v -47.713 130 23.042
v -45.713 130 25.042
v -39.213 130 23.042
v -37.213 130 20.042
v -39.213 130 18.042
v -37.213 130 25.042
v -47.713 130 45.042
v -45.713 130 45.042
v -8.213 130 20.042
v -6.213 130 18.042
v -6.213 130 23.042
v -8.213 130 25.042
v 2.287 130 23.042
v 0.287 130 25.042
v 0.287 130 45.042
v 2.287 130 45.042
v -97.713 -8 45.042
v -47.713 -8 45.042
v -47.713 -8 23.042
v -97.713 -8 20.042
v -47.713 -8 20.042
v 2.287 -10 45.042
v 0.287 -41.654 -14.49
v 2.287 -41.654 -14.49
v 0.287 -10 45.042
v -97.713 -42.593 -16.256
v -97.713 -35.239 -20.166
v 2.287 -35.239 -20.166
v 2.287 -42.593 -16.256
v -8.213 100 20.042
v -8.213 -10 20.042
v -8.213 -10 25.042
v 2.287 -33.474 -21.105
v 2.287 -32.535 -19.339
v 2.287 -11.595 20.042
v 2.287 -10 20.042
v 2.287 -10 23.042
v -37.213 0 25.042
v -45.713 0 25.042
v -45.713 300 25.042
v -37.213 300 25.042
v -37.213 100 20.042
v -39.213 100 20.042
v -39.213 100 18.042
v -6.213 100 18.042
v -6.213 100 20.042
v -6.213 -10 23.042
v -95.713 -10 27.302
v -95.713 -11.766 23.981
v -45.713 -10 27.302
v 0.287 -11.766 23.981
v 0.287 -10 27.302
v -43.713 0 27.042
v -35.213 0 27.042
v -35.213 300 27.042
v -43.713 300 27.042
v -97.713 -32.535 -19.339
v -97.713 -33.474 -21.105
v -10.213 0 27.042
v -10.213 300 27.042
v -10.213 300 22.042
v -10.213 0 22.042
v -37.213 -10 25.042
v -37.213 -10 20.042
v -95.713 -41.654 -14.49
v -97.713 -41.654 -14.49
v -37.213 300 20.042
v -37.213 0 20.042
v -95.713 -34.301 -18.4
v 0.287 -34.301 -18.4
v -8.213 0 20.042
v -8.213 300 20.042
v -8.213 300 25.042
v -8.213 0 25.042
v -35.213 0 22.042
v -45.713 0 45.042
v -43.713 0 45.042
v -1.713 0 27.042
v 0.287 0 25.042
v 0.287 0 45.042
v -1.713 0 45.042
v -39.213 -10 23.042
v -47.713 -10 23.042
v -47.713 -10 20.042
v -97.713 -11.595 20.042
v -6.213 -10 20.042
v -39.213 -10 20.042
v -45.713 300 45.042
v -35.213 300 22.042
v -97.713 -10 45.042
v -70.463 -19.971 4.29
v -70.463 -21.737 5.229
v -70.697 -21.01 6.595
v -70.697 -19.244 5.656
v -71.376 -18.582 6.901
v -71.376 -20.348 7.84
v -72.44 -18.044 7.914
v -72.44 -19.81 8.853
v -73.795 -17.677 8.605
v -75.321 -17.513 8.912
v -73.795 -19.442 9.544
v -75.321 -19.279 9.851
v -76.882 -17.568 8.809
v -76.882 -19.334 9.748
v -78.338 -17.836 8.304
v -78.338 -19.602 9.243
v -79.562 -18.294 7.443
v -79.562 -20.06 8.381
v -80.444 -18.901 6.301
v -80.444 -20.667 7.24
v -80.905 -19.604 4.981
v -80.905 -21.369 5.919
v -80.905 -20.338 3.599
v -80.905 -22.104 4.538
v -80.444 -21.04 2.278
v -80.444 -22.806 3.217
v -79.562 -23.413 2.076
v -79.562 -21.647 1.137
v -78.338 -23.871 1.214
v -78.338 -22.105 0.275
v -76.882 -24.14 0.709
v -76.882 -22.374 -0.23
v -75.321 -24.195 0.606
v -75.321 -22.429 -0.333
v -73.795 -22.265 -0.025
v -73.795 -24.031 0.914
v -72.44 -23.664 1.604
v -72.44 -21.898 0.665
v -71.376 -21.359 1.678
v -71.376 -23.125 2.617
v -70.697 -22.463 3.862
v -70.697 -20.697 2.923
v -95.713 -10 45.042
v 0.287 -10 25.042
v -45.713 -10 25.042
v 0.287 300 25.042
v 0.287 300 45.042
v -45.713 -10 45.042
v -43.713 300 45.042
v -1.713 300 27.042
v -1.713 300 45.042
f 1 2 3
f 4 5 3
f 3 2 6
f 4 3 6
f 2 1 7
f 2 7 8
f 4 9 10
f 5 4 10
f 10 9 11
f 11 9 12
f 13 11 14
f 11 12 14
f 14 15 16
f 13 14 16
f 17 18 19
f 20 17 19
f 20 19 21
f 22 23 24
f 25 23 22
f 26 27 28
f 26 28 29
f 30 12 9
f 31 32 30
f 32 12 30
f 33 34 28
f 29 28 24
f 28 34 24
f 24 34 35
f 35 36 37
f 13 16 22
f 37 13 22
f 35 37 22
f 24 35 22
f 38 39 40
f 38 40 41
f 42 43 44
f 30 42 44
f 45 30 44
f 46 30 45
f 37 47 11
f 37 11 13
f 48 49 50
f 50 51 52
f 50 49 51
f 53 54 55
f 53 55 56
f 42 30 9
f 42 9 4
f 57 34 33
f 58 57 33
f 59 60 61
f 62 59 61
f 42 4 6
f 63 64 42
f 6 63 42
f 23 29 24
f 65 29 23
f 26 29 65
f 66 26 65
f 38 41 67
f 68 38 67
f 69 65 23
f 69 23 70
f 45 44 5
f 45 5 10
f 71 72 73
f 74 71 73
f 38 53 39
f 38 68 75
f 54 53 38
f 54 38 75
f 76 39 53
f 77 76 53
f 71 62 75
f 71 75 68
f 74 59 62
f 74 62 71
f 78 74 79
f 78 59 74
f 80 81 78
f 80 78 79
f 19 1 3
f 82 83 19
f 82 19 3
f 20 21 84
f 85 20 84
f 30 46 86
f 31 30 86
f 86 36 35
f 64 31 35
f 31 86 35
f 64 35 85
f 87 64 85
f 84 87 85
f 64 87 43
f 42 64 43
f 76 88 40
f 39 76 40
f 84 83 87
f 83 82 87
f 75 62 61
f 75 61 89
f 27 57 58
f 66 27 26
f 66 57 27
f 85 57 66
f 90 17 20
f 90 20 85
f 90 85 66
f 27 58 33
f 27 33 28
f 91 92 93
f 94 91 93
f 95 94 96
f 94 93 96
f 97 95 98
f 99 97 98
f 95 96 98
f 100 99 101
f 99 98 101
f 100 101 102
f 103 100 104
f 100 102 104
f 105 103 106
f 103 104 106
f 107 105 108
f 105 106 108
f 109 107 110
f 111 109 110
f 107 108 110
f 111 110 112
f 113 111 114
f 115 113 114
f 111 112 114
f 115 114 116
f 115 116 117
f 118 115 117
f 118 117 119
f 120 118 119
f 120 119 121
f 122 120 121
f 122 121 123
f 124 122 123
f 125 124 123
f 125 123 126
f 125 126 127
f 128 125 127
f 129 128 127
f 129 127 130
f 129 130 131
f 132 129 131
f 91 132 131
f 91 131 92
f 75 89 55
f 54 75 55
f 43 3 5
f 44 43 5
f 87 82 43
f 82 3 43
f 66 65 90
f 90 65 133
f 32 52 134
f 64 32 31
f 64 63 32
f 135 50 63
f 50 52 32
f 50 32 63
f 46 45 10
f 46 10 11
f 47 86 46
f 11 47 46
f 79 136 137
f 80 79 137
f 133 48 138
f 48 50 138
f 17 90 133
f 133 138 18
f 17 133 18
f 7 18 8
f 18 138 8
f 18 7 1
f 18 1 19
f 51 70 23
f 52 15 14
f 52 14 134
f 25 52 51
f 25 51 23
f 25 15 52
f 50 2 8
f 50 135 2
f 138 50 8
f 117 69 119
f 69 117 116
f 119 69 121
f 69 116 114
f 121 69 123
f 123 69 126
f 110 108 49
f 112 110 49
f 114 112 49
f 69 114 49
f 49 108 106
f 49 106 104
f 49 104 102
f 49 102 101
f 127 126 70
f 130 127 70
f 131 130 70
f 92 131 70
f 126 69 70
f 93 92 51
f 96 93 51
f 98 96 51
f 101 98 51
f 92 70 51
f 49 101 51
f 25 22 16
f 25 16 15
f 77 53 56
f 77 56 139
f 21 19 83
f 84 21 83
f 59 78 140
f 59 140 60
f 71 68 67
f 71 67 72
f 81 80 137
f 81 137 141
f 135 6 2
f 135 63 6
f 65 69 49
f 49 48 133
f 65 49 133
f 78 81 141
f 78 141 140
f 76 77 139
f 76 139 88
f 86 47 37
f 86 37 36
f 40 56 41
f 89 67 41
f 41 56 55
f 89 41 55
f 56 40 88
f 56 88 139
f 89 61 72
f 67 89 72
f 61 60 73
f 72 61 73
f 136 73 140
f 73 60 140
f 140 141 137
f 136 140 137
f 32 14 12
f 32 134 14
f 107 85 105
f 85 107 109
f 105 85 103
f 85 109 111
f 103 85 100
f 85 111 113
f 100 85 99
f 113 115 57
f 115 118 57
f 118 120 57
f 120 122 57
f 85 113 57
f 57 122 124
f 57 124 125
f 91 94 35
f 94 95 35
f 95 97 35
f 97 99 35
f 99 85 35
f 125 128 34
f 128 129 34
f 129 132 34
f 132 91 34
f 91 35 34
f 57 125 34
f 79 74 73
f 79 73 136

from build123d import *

# Parameters (mm, degrees)
F1_DEPTH       = 300
F2_DEPTH       = 10
F2_DEPTH_BACK  = 130
F4_DEPTH       = 50
F4_DEPTH_BACK  = 50
F5_START       = -48
F5_DEPTH       = 2
F6_START       = -100
F6_DEPTH       = 30
F8_START       = 48
F8_DEPTH       = 2
F3_W           = 2
F3_H           = 3
F9_DEPTH       = 50
F10_DEPTH      = 50
F10_DEPTH_BACK = 50
F7_R           = 5.25
F11_DEPTH      = 25


with BuildPart() as f1:
    # F0 (on Front) → F1 (new body)
    with BuildSketch(Plane.XZ):
        Polygon((-43.7134447098, 45.0421461165), (-45.7134447098, 45.0421461165), (-45.7134447098, 25.0421461165), (-37.2134447098, 25.0421461165), (-37.2134447098, 20.0421461165), (-8.2134447098, 20.0421461165), (-8.2134447098, 25.0421461165), (0.2865552902, 25.0421461165), (0.2865552902, 45.0421461165), (-1.7134447098, 45.0421461165), (-1.7134447098, 27.0421461165), (-10.2134447098, 27.0421461165), (-10.2134447098, 22.0421461165), (-35.2134447098, 22.0421461165), (-35.2134447098, 27.0421461165), (-43.7134447098, 27.0421461165), align=None)
    extrude(amount=-F1_DEPTH)


with BuildPart() as f2:
    # F0 (on Front) → F2 (new body, two sides)
    with BuildSketch(Plane.XZ) as f2_sk:
        Polygon((-45.7134447098, 25.0421461165), (-45.7134447098, 45.0421461165), (-47.7134447098, 45.0421461165), (-47.7134447098, 23.0421461165), (-39.2134447098, 23.0421461165), (-39.2134447098, 20.0421461165), (-37.2134447098, 20.0421461165), (-37.2134447098, 25.0421461165), align=None)
    extrude(amount=F2_DEPTH)
    extrude(f2_sk.sketch, amount=-F2_DEPTH_BACK)



with BuildPart() as f2b:
    # F0 (on Front) → F2, piece 2 (new body, two sides)
    with BuildSketch(Plane.XZ) as f2_2_sk:
        Polygon((-8.2134447098, 25.0421461165), (-8.2134447098, 20.0421461165), (-6.2134447098, 20.0421461165), (-6.2134447098, 23.0421461165), (2.2865552902, 23.0421461165), (2.2865552902, 45.0421461165), (0.2865552902, 45.0421461165), (0.2865552902, 25.0421461165), align=None)
    extrude(amount=F2_DEPTH)
    extrude(f2_2_sk.sketch, amount=-F2_DEPTH_BACK)


with BuildPart() as f2_1:
    add(f2.part)

    add(f2b.part)  # F4 merges F2b
    # F3 (on face) → F4 (join, two sides)
    with BuildSketch(Plane(origin=(-47.7134447098, 0, 0), x_dir=(0, -1, 0), z_dir=(-1, 0, 0))) as f4_sk:
        Polygon((11.7658951857, 23.9810892421), (10, 23.0421461165), (11.595128295, 20.0421461165), (32.5346350137, -19.3393383407), (34.3005301994, -18.4003952152), align=None)
        Polygon((10, 27.3022550529), (10, 23.0421461165), (11.7658951857, 23.9810892421), align=None)
        Polygon((11.595128295, 20.0421461165), (10, 23.0421461165), (10, 20.0421461165), align=None)
    extrude(amount=-F4_DEPTH)
    extrude(f4_sk.sketch, amount=F4_DEPTH_BACK)

    # F3 (on face) → F5 (join)
    with BuildSketch(Plane(origin=(-47.7134447098, 0, 0), x_dir=(0, -1, 0), z_dir=(-1, 0, 0)).offset(F5_START)):
        Polygon((19.1194132981, 27.8910241783), (11.7658951857, 23.9810892421), (34.3005301994, -18.4003952152), (41.6540483118, -14.4904602789), align=None)
        Polygon((10, 27.3022550529), (11.7658951857, 23.9810892421), (19.1194132981, 27.8910241783), (10, 45.0421461165), align=None)
    extrude(amount=-F5_DEPTH)

    # F0 (on Front) → F6 (join)
    with BuildSketch(Plane.XZ.offset(F6_START)):
        Polygon((-8.2134447098, 20.0421461165), (-37.2134447098, 20.0421461165), (-39.2134447098, 20.0421461165), (-39.2134447098, 18.0421461165), (-6.2134447098, 18.0421461165), (-6.2134447098, 20.0421461165), align=None)
    extrude(amount=-F6_DEPTH)

    # F3 (on face) → F8 (join)
    with BuildSketch(Plane(origin=(-47.7134447098, 0, 0), x_dir=(0, -1, 0), z_dir=(-1, 0, 0)).offset(F8_START)):
        Polygon((19.1194132981, 27.8910241783), (11.7658951857, 23.9810892421), (34.3005301994, -18.4003952152), (41.6540483118, -14.4904602789), align=None)
        Polygon((10, 27.3022550529), (11.7658951857, 23.9810892421), (19.1194132981, 27.8910241783), (10, 45.0421461165), align=None)
    extrude(amount=F8_DEPTH)

    # F3 (on face) → F9 (join)
    with BuildSketch(Plane(origin=(-47.7134447098, 0, 0), x_dir=(0, -1, 0), z_dir=(-1, 0, 0))):
        Polygon((8, 23.0421461165), (10, 23.0421461165), (10, 27.3022550529), (10, 45.0421461165), (8, 45.0421461165), align=None)
        with Locations((9, 21.5421461165)):
            Rectangle(F3_W, F3_H)
    extrude(amount=F9_DEPTH)

    # F3 (on face) → F10 (join, two sides)
    with BuildSketch(Plane(origin=(-47.7134447098, 0, 0), x_dir=(0, -1, 0), z_dir=(-1, 0, 0))) as f10_sk:
        Polygon((34.3005301994, -18.4003952152), (32.5346350137, -19.3393383407), (33.4735781393, -21.1052335265), (35.239473325, -20.1662904009), align=None)
        Polygon((41.6540483118, -14.4904602789), (34.3005301994, -18.4003952152), (35.239473325, -20.1662904009), (42.5929914374, -16.2563554646), align=None)
    extrude(amount=F10_DEPTH)
    extrude(f10_sk.sketch, amount=-F10_DEPTH_BACK)

    # F7 (on face) → F11 (cut)
    with BuildSketch(Plane(origin=(0, -19.1132621445, 10.1627017521), x_dir=(1, 0, 0), z_dir=(0, -0.8829475929, 0.4694715628))):
        with Locations((-75.7134447098, -5.5882552493)):
            Circle(F7_R)
    extrude(amount=-F11_DEPTH, mode=Mode.SUBTRACT)


solid = Compound([f1.part, f2_1.part])
